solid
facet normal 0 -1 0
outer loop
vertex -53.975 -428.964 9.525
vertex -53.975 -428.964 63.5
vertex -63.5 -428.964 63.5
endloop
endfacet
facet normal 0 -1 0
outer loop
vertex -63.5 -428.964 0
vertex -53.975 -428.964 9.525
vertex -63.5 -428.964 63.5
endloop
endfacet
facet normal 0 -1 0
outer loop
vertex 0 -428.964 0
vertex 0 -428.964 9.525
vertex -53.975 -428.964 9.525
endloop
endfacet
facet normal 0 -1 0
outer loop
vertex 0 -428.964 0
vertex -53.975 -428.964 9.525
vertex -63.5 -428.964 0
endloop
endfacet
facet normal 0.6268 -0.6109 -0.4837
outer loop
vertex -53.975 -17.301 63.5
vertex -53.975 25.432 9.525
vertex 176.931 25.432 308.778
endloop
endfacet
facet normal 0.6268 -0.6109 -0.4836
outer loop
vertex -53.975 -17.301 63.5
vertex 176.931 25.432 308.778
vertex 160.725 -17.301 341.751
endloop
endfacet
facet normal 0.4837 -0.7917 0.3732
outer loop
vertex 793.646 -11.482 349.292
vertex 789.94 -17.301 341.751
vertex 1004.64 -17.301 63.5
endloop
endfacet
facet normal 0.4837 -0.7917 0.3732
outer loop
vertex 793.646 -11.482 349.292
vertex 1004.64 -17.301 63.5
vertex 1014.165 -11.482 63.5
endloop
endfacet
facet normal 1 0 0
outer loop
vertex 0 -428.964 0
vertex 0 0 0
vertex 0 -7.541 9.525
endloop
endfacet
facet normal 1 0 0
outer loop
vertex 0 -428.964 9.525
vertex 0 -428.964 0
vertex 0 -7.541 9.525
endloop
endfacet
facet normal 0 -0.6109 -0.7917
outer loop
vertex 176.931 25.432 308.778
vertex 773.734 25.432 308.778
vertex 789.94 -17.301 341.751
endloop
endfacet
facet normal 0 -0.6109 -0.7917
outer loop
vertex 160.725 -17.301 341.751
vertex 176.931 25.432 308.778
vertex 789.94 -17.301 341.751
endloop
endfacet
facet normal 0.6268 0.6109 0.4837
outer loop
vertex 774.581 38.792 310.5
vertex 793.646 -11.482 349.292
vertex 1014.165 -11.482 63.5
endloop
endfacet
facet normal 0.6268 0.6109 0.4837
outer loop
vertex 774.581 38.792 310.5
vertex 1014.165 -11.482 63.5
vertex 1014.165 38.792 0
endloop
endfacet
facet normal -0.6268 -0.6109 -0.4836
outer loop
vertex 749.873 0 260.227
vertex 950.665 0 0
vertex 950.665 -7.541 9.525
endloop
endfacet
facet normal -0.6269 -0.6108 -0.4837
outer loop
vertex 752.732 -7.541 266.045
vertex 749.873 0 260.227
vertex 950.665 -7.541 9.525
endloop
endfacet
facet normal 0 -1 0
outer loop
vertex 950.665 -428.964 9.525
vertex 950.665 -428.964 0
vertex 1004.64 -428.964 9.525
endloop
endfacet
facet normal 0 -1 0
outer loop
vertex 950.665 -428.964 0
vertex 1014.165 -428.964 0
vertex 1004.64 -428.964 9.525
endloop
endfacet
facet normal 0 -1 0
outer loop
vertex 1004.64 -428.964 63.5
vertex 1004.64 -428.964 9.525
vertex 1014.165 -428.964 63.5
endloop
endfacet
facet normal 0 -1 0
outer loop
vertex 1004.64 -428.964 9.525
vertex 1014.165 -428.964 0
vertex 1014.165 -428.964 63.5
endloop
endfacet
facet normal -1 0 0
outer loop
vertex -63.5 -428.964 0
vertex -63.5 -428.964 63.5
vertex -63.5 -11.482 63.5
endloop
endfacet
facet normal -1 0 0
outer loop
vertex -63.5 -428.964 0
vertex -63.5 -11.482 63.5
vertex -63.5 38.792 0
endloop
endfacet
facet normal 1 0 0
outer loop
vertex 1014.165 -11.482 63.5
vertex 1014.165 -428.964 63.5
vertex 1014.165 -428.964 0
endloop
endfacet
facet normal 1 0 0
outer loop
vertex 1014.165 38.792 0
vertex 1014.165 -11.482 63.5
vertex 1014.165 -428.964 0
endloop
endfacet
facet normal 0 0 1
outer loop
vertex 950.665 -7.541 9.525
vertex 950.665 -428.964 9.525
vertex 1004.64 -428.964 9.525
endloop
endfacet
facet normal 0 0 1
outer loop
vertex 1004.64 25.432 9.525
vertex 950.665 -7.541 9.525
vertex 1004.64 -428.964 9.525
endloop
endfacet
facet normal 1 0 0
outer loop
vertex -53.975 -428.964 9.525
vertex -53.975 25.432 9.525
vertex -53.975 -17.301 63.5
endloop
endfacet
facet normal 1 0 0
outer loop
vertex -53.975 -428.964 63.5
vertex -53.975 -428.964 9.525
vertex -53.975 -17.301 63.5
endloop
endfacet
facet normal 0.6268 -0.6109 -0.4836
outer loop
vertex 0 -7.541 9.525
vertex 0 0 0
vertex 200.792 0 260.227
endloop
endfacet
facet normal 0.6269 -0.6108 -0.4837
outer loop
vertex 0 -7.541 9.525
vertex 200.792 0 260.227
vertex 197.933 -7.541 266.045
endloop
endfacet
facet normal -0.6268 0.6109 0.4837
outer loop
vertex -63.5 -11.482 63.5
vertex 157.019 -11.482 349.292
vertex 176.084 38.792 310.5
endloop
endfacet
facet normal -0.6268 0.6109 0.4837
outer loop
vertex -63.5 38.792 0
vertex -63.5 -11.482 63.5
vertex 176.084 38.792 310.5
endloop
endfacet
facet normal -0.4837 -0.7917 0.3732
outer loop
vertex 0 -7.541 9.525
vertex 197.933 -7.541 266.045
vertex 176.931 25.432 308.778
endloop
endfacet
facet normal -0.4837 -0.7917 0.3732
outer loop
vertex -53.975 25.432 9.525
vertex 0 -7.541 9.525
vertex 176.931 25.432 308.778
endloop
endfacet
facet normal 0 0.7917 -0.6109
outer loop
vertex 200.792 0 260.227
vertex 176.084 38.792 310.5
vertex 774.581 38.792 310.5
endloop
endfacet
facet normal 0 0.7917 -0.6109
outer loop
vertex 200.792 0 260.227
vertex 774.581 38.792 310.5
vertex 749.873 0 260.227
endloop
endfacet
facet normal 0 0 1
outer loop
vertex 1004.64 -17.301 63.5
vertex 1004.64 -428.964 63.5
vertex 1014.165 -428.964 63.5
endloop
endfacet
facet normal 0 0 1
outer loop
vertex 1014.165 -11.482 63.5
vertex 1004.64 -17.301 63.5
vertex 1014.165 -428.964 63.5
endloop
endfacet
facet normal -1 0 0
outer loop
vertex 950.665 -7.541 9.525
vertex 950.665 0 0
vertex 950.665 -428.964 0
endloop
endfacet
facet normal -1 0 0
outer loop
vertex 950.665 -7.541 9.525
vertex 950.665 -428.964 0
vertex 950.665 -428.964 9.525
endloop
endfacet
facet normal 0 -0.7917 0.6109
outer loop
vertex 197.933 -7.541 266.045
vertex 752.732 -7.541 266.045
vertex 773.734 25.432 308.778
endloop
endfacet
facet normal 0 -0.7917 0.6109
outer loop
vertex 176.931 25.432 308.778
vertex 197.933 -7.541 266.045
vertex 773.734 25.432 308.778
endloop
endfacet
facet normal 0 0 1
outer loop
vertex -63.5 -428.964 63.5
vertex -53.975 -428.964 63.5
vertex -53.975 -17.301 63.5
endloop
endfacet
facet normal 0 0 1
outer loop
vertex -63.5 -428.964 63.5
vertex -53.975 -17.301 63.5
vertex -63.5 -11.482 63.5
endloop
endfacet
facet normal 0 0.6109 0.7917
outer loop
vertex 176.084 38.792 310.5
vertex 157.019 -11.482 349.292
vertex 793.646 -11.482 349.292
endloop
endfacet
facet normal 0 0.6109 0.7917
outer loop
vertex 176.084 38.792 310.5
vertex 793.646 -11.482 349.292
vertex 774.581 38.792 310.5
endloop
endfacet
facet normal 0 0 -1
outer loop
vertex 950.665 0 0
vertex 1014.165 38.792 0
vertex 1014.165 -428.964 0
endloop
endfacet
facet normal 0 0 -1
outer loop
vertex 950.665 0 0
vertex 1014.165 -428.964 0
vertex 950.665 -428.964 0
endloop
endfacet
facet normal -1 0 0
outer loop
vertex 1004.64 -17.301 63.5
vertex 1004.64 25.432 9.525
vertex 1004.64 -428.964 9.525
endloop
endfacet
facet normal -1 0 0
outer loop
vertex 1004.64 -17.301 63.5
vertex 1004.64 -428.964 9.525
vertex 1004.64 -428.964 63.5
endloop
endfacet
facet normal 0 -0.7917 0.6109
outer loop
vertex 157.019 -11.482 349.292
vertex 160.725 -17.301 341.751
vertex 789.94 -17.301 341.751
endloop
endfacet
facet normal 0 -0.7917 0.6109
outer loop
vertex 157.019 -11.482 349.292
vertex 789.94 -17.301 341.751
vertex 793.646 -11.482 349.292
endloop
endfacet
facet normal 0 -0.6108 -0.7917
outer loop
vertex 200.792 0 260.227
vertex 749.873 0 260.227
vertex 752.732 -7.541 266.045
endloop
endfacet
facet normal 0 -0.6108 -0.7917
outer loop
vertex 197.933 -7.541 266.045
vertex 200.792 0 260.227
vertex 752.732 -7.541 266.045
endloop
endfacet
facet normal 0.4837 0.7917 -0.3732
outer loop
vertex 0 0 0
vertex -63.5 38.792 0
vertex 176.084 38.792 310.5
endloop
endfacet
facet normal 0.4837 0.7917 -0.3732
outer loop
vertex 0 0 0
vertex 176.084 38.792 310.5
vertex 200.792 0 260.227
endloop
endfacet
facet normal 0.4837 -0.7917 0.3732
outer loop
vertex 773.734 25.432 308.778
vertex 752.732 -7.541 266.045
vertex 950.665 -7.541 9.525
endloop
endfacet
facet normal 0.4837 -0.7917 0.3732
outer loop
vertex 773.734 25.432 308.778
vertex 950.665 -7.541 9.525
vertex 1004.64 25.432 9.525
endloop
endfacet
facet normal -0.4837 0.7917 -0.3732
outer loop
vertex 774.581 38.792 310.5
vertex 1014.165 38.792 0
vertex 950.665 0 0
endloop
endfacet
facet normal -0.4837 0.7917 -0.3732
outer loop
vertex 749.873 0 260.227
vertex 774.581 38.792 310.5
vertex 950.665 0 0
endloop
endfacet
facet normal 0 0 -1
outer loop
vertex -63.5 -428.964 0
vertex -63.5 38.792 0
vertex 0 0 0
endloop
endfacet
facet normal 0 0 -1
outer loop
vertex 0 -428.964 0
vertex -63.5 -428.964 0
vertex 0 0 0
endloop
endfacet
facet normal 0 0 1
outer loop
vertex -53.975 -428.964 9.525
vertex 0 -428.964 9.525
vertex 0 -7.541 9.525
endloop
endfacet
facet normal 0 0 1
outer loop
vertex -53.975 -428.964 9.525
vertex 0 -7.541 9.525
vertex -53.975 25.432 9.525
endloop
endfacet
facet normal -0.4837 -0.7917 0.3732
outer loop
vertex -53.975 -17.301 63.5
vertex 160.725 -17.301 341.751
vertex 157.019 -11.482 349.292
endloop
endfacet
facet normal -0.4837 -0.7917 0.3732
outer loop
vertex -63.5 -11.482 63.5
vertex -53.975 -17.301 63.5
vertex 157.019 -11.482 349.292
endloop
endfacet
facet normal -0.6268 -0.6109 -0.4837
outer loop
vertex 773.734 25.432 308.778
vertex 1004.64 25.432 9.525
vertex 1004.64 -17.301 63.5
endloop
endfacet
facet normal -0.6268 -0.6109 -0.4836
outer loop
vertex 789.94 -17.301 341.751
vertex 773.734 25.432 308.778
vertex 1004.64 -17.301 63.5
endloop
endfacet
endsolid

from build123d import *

# Parameters (mm, degrees)
F3_W   = 53.975
F3_H   = 9.525
F3_W_2 = 9.525
F3_H_2 = 53.975


with BuildPart() as f4:
    # F4: sweep along a path in F1, F0, F1
    with BuildLine(Plane.XY) as f4_path:
        Line((0, 0), (0, -428.9635121822))
    with BuildLine(Plane.XZ) as f4_path_2:
        Line((0, 0), (200.792491436, 260.2265179157))
        Line((200.792491436, 260.2265179157), (475.3324985504, 260.2265179157))
        Line((475.3324985504, 260.2265179157), (749.8725056648, 260.2265179157))
        Line((749.8725056648, 260.2265179157), (950.6649971008, 0))
    with BuildLine(Plane.XY) as f4_path_3:
        Line((950.6649971008, 0), (950.6649971008, -428.9635121822))
    # F3 (on plane+point) → F4 (sweep)
    with BuildSketch(Plane.XZ.offset(428.9635121822)):
        with Locations((-26.9875, 4.7625)):
            Rectangle(F3_W, F3_H)
        with Locations((-58.7375, 36.5125)):
            Rectangle(F3_W_2, F3_H_2)
        with Locations((-58.7375, 4.7625)):
            Rectangle(F3_W_2, F3_H)
    sweep(path=f4_path.line + f4_path_2.line + f4_path_3.line, transition=Transition.RIGHT)


solid = f4.part
